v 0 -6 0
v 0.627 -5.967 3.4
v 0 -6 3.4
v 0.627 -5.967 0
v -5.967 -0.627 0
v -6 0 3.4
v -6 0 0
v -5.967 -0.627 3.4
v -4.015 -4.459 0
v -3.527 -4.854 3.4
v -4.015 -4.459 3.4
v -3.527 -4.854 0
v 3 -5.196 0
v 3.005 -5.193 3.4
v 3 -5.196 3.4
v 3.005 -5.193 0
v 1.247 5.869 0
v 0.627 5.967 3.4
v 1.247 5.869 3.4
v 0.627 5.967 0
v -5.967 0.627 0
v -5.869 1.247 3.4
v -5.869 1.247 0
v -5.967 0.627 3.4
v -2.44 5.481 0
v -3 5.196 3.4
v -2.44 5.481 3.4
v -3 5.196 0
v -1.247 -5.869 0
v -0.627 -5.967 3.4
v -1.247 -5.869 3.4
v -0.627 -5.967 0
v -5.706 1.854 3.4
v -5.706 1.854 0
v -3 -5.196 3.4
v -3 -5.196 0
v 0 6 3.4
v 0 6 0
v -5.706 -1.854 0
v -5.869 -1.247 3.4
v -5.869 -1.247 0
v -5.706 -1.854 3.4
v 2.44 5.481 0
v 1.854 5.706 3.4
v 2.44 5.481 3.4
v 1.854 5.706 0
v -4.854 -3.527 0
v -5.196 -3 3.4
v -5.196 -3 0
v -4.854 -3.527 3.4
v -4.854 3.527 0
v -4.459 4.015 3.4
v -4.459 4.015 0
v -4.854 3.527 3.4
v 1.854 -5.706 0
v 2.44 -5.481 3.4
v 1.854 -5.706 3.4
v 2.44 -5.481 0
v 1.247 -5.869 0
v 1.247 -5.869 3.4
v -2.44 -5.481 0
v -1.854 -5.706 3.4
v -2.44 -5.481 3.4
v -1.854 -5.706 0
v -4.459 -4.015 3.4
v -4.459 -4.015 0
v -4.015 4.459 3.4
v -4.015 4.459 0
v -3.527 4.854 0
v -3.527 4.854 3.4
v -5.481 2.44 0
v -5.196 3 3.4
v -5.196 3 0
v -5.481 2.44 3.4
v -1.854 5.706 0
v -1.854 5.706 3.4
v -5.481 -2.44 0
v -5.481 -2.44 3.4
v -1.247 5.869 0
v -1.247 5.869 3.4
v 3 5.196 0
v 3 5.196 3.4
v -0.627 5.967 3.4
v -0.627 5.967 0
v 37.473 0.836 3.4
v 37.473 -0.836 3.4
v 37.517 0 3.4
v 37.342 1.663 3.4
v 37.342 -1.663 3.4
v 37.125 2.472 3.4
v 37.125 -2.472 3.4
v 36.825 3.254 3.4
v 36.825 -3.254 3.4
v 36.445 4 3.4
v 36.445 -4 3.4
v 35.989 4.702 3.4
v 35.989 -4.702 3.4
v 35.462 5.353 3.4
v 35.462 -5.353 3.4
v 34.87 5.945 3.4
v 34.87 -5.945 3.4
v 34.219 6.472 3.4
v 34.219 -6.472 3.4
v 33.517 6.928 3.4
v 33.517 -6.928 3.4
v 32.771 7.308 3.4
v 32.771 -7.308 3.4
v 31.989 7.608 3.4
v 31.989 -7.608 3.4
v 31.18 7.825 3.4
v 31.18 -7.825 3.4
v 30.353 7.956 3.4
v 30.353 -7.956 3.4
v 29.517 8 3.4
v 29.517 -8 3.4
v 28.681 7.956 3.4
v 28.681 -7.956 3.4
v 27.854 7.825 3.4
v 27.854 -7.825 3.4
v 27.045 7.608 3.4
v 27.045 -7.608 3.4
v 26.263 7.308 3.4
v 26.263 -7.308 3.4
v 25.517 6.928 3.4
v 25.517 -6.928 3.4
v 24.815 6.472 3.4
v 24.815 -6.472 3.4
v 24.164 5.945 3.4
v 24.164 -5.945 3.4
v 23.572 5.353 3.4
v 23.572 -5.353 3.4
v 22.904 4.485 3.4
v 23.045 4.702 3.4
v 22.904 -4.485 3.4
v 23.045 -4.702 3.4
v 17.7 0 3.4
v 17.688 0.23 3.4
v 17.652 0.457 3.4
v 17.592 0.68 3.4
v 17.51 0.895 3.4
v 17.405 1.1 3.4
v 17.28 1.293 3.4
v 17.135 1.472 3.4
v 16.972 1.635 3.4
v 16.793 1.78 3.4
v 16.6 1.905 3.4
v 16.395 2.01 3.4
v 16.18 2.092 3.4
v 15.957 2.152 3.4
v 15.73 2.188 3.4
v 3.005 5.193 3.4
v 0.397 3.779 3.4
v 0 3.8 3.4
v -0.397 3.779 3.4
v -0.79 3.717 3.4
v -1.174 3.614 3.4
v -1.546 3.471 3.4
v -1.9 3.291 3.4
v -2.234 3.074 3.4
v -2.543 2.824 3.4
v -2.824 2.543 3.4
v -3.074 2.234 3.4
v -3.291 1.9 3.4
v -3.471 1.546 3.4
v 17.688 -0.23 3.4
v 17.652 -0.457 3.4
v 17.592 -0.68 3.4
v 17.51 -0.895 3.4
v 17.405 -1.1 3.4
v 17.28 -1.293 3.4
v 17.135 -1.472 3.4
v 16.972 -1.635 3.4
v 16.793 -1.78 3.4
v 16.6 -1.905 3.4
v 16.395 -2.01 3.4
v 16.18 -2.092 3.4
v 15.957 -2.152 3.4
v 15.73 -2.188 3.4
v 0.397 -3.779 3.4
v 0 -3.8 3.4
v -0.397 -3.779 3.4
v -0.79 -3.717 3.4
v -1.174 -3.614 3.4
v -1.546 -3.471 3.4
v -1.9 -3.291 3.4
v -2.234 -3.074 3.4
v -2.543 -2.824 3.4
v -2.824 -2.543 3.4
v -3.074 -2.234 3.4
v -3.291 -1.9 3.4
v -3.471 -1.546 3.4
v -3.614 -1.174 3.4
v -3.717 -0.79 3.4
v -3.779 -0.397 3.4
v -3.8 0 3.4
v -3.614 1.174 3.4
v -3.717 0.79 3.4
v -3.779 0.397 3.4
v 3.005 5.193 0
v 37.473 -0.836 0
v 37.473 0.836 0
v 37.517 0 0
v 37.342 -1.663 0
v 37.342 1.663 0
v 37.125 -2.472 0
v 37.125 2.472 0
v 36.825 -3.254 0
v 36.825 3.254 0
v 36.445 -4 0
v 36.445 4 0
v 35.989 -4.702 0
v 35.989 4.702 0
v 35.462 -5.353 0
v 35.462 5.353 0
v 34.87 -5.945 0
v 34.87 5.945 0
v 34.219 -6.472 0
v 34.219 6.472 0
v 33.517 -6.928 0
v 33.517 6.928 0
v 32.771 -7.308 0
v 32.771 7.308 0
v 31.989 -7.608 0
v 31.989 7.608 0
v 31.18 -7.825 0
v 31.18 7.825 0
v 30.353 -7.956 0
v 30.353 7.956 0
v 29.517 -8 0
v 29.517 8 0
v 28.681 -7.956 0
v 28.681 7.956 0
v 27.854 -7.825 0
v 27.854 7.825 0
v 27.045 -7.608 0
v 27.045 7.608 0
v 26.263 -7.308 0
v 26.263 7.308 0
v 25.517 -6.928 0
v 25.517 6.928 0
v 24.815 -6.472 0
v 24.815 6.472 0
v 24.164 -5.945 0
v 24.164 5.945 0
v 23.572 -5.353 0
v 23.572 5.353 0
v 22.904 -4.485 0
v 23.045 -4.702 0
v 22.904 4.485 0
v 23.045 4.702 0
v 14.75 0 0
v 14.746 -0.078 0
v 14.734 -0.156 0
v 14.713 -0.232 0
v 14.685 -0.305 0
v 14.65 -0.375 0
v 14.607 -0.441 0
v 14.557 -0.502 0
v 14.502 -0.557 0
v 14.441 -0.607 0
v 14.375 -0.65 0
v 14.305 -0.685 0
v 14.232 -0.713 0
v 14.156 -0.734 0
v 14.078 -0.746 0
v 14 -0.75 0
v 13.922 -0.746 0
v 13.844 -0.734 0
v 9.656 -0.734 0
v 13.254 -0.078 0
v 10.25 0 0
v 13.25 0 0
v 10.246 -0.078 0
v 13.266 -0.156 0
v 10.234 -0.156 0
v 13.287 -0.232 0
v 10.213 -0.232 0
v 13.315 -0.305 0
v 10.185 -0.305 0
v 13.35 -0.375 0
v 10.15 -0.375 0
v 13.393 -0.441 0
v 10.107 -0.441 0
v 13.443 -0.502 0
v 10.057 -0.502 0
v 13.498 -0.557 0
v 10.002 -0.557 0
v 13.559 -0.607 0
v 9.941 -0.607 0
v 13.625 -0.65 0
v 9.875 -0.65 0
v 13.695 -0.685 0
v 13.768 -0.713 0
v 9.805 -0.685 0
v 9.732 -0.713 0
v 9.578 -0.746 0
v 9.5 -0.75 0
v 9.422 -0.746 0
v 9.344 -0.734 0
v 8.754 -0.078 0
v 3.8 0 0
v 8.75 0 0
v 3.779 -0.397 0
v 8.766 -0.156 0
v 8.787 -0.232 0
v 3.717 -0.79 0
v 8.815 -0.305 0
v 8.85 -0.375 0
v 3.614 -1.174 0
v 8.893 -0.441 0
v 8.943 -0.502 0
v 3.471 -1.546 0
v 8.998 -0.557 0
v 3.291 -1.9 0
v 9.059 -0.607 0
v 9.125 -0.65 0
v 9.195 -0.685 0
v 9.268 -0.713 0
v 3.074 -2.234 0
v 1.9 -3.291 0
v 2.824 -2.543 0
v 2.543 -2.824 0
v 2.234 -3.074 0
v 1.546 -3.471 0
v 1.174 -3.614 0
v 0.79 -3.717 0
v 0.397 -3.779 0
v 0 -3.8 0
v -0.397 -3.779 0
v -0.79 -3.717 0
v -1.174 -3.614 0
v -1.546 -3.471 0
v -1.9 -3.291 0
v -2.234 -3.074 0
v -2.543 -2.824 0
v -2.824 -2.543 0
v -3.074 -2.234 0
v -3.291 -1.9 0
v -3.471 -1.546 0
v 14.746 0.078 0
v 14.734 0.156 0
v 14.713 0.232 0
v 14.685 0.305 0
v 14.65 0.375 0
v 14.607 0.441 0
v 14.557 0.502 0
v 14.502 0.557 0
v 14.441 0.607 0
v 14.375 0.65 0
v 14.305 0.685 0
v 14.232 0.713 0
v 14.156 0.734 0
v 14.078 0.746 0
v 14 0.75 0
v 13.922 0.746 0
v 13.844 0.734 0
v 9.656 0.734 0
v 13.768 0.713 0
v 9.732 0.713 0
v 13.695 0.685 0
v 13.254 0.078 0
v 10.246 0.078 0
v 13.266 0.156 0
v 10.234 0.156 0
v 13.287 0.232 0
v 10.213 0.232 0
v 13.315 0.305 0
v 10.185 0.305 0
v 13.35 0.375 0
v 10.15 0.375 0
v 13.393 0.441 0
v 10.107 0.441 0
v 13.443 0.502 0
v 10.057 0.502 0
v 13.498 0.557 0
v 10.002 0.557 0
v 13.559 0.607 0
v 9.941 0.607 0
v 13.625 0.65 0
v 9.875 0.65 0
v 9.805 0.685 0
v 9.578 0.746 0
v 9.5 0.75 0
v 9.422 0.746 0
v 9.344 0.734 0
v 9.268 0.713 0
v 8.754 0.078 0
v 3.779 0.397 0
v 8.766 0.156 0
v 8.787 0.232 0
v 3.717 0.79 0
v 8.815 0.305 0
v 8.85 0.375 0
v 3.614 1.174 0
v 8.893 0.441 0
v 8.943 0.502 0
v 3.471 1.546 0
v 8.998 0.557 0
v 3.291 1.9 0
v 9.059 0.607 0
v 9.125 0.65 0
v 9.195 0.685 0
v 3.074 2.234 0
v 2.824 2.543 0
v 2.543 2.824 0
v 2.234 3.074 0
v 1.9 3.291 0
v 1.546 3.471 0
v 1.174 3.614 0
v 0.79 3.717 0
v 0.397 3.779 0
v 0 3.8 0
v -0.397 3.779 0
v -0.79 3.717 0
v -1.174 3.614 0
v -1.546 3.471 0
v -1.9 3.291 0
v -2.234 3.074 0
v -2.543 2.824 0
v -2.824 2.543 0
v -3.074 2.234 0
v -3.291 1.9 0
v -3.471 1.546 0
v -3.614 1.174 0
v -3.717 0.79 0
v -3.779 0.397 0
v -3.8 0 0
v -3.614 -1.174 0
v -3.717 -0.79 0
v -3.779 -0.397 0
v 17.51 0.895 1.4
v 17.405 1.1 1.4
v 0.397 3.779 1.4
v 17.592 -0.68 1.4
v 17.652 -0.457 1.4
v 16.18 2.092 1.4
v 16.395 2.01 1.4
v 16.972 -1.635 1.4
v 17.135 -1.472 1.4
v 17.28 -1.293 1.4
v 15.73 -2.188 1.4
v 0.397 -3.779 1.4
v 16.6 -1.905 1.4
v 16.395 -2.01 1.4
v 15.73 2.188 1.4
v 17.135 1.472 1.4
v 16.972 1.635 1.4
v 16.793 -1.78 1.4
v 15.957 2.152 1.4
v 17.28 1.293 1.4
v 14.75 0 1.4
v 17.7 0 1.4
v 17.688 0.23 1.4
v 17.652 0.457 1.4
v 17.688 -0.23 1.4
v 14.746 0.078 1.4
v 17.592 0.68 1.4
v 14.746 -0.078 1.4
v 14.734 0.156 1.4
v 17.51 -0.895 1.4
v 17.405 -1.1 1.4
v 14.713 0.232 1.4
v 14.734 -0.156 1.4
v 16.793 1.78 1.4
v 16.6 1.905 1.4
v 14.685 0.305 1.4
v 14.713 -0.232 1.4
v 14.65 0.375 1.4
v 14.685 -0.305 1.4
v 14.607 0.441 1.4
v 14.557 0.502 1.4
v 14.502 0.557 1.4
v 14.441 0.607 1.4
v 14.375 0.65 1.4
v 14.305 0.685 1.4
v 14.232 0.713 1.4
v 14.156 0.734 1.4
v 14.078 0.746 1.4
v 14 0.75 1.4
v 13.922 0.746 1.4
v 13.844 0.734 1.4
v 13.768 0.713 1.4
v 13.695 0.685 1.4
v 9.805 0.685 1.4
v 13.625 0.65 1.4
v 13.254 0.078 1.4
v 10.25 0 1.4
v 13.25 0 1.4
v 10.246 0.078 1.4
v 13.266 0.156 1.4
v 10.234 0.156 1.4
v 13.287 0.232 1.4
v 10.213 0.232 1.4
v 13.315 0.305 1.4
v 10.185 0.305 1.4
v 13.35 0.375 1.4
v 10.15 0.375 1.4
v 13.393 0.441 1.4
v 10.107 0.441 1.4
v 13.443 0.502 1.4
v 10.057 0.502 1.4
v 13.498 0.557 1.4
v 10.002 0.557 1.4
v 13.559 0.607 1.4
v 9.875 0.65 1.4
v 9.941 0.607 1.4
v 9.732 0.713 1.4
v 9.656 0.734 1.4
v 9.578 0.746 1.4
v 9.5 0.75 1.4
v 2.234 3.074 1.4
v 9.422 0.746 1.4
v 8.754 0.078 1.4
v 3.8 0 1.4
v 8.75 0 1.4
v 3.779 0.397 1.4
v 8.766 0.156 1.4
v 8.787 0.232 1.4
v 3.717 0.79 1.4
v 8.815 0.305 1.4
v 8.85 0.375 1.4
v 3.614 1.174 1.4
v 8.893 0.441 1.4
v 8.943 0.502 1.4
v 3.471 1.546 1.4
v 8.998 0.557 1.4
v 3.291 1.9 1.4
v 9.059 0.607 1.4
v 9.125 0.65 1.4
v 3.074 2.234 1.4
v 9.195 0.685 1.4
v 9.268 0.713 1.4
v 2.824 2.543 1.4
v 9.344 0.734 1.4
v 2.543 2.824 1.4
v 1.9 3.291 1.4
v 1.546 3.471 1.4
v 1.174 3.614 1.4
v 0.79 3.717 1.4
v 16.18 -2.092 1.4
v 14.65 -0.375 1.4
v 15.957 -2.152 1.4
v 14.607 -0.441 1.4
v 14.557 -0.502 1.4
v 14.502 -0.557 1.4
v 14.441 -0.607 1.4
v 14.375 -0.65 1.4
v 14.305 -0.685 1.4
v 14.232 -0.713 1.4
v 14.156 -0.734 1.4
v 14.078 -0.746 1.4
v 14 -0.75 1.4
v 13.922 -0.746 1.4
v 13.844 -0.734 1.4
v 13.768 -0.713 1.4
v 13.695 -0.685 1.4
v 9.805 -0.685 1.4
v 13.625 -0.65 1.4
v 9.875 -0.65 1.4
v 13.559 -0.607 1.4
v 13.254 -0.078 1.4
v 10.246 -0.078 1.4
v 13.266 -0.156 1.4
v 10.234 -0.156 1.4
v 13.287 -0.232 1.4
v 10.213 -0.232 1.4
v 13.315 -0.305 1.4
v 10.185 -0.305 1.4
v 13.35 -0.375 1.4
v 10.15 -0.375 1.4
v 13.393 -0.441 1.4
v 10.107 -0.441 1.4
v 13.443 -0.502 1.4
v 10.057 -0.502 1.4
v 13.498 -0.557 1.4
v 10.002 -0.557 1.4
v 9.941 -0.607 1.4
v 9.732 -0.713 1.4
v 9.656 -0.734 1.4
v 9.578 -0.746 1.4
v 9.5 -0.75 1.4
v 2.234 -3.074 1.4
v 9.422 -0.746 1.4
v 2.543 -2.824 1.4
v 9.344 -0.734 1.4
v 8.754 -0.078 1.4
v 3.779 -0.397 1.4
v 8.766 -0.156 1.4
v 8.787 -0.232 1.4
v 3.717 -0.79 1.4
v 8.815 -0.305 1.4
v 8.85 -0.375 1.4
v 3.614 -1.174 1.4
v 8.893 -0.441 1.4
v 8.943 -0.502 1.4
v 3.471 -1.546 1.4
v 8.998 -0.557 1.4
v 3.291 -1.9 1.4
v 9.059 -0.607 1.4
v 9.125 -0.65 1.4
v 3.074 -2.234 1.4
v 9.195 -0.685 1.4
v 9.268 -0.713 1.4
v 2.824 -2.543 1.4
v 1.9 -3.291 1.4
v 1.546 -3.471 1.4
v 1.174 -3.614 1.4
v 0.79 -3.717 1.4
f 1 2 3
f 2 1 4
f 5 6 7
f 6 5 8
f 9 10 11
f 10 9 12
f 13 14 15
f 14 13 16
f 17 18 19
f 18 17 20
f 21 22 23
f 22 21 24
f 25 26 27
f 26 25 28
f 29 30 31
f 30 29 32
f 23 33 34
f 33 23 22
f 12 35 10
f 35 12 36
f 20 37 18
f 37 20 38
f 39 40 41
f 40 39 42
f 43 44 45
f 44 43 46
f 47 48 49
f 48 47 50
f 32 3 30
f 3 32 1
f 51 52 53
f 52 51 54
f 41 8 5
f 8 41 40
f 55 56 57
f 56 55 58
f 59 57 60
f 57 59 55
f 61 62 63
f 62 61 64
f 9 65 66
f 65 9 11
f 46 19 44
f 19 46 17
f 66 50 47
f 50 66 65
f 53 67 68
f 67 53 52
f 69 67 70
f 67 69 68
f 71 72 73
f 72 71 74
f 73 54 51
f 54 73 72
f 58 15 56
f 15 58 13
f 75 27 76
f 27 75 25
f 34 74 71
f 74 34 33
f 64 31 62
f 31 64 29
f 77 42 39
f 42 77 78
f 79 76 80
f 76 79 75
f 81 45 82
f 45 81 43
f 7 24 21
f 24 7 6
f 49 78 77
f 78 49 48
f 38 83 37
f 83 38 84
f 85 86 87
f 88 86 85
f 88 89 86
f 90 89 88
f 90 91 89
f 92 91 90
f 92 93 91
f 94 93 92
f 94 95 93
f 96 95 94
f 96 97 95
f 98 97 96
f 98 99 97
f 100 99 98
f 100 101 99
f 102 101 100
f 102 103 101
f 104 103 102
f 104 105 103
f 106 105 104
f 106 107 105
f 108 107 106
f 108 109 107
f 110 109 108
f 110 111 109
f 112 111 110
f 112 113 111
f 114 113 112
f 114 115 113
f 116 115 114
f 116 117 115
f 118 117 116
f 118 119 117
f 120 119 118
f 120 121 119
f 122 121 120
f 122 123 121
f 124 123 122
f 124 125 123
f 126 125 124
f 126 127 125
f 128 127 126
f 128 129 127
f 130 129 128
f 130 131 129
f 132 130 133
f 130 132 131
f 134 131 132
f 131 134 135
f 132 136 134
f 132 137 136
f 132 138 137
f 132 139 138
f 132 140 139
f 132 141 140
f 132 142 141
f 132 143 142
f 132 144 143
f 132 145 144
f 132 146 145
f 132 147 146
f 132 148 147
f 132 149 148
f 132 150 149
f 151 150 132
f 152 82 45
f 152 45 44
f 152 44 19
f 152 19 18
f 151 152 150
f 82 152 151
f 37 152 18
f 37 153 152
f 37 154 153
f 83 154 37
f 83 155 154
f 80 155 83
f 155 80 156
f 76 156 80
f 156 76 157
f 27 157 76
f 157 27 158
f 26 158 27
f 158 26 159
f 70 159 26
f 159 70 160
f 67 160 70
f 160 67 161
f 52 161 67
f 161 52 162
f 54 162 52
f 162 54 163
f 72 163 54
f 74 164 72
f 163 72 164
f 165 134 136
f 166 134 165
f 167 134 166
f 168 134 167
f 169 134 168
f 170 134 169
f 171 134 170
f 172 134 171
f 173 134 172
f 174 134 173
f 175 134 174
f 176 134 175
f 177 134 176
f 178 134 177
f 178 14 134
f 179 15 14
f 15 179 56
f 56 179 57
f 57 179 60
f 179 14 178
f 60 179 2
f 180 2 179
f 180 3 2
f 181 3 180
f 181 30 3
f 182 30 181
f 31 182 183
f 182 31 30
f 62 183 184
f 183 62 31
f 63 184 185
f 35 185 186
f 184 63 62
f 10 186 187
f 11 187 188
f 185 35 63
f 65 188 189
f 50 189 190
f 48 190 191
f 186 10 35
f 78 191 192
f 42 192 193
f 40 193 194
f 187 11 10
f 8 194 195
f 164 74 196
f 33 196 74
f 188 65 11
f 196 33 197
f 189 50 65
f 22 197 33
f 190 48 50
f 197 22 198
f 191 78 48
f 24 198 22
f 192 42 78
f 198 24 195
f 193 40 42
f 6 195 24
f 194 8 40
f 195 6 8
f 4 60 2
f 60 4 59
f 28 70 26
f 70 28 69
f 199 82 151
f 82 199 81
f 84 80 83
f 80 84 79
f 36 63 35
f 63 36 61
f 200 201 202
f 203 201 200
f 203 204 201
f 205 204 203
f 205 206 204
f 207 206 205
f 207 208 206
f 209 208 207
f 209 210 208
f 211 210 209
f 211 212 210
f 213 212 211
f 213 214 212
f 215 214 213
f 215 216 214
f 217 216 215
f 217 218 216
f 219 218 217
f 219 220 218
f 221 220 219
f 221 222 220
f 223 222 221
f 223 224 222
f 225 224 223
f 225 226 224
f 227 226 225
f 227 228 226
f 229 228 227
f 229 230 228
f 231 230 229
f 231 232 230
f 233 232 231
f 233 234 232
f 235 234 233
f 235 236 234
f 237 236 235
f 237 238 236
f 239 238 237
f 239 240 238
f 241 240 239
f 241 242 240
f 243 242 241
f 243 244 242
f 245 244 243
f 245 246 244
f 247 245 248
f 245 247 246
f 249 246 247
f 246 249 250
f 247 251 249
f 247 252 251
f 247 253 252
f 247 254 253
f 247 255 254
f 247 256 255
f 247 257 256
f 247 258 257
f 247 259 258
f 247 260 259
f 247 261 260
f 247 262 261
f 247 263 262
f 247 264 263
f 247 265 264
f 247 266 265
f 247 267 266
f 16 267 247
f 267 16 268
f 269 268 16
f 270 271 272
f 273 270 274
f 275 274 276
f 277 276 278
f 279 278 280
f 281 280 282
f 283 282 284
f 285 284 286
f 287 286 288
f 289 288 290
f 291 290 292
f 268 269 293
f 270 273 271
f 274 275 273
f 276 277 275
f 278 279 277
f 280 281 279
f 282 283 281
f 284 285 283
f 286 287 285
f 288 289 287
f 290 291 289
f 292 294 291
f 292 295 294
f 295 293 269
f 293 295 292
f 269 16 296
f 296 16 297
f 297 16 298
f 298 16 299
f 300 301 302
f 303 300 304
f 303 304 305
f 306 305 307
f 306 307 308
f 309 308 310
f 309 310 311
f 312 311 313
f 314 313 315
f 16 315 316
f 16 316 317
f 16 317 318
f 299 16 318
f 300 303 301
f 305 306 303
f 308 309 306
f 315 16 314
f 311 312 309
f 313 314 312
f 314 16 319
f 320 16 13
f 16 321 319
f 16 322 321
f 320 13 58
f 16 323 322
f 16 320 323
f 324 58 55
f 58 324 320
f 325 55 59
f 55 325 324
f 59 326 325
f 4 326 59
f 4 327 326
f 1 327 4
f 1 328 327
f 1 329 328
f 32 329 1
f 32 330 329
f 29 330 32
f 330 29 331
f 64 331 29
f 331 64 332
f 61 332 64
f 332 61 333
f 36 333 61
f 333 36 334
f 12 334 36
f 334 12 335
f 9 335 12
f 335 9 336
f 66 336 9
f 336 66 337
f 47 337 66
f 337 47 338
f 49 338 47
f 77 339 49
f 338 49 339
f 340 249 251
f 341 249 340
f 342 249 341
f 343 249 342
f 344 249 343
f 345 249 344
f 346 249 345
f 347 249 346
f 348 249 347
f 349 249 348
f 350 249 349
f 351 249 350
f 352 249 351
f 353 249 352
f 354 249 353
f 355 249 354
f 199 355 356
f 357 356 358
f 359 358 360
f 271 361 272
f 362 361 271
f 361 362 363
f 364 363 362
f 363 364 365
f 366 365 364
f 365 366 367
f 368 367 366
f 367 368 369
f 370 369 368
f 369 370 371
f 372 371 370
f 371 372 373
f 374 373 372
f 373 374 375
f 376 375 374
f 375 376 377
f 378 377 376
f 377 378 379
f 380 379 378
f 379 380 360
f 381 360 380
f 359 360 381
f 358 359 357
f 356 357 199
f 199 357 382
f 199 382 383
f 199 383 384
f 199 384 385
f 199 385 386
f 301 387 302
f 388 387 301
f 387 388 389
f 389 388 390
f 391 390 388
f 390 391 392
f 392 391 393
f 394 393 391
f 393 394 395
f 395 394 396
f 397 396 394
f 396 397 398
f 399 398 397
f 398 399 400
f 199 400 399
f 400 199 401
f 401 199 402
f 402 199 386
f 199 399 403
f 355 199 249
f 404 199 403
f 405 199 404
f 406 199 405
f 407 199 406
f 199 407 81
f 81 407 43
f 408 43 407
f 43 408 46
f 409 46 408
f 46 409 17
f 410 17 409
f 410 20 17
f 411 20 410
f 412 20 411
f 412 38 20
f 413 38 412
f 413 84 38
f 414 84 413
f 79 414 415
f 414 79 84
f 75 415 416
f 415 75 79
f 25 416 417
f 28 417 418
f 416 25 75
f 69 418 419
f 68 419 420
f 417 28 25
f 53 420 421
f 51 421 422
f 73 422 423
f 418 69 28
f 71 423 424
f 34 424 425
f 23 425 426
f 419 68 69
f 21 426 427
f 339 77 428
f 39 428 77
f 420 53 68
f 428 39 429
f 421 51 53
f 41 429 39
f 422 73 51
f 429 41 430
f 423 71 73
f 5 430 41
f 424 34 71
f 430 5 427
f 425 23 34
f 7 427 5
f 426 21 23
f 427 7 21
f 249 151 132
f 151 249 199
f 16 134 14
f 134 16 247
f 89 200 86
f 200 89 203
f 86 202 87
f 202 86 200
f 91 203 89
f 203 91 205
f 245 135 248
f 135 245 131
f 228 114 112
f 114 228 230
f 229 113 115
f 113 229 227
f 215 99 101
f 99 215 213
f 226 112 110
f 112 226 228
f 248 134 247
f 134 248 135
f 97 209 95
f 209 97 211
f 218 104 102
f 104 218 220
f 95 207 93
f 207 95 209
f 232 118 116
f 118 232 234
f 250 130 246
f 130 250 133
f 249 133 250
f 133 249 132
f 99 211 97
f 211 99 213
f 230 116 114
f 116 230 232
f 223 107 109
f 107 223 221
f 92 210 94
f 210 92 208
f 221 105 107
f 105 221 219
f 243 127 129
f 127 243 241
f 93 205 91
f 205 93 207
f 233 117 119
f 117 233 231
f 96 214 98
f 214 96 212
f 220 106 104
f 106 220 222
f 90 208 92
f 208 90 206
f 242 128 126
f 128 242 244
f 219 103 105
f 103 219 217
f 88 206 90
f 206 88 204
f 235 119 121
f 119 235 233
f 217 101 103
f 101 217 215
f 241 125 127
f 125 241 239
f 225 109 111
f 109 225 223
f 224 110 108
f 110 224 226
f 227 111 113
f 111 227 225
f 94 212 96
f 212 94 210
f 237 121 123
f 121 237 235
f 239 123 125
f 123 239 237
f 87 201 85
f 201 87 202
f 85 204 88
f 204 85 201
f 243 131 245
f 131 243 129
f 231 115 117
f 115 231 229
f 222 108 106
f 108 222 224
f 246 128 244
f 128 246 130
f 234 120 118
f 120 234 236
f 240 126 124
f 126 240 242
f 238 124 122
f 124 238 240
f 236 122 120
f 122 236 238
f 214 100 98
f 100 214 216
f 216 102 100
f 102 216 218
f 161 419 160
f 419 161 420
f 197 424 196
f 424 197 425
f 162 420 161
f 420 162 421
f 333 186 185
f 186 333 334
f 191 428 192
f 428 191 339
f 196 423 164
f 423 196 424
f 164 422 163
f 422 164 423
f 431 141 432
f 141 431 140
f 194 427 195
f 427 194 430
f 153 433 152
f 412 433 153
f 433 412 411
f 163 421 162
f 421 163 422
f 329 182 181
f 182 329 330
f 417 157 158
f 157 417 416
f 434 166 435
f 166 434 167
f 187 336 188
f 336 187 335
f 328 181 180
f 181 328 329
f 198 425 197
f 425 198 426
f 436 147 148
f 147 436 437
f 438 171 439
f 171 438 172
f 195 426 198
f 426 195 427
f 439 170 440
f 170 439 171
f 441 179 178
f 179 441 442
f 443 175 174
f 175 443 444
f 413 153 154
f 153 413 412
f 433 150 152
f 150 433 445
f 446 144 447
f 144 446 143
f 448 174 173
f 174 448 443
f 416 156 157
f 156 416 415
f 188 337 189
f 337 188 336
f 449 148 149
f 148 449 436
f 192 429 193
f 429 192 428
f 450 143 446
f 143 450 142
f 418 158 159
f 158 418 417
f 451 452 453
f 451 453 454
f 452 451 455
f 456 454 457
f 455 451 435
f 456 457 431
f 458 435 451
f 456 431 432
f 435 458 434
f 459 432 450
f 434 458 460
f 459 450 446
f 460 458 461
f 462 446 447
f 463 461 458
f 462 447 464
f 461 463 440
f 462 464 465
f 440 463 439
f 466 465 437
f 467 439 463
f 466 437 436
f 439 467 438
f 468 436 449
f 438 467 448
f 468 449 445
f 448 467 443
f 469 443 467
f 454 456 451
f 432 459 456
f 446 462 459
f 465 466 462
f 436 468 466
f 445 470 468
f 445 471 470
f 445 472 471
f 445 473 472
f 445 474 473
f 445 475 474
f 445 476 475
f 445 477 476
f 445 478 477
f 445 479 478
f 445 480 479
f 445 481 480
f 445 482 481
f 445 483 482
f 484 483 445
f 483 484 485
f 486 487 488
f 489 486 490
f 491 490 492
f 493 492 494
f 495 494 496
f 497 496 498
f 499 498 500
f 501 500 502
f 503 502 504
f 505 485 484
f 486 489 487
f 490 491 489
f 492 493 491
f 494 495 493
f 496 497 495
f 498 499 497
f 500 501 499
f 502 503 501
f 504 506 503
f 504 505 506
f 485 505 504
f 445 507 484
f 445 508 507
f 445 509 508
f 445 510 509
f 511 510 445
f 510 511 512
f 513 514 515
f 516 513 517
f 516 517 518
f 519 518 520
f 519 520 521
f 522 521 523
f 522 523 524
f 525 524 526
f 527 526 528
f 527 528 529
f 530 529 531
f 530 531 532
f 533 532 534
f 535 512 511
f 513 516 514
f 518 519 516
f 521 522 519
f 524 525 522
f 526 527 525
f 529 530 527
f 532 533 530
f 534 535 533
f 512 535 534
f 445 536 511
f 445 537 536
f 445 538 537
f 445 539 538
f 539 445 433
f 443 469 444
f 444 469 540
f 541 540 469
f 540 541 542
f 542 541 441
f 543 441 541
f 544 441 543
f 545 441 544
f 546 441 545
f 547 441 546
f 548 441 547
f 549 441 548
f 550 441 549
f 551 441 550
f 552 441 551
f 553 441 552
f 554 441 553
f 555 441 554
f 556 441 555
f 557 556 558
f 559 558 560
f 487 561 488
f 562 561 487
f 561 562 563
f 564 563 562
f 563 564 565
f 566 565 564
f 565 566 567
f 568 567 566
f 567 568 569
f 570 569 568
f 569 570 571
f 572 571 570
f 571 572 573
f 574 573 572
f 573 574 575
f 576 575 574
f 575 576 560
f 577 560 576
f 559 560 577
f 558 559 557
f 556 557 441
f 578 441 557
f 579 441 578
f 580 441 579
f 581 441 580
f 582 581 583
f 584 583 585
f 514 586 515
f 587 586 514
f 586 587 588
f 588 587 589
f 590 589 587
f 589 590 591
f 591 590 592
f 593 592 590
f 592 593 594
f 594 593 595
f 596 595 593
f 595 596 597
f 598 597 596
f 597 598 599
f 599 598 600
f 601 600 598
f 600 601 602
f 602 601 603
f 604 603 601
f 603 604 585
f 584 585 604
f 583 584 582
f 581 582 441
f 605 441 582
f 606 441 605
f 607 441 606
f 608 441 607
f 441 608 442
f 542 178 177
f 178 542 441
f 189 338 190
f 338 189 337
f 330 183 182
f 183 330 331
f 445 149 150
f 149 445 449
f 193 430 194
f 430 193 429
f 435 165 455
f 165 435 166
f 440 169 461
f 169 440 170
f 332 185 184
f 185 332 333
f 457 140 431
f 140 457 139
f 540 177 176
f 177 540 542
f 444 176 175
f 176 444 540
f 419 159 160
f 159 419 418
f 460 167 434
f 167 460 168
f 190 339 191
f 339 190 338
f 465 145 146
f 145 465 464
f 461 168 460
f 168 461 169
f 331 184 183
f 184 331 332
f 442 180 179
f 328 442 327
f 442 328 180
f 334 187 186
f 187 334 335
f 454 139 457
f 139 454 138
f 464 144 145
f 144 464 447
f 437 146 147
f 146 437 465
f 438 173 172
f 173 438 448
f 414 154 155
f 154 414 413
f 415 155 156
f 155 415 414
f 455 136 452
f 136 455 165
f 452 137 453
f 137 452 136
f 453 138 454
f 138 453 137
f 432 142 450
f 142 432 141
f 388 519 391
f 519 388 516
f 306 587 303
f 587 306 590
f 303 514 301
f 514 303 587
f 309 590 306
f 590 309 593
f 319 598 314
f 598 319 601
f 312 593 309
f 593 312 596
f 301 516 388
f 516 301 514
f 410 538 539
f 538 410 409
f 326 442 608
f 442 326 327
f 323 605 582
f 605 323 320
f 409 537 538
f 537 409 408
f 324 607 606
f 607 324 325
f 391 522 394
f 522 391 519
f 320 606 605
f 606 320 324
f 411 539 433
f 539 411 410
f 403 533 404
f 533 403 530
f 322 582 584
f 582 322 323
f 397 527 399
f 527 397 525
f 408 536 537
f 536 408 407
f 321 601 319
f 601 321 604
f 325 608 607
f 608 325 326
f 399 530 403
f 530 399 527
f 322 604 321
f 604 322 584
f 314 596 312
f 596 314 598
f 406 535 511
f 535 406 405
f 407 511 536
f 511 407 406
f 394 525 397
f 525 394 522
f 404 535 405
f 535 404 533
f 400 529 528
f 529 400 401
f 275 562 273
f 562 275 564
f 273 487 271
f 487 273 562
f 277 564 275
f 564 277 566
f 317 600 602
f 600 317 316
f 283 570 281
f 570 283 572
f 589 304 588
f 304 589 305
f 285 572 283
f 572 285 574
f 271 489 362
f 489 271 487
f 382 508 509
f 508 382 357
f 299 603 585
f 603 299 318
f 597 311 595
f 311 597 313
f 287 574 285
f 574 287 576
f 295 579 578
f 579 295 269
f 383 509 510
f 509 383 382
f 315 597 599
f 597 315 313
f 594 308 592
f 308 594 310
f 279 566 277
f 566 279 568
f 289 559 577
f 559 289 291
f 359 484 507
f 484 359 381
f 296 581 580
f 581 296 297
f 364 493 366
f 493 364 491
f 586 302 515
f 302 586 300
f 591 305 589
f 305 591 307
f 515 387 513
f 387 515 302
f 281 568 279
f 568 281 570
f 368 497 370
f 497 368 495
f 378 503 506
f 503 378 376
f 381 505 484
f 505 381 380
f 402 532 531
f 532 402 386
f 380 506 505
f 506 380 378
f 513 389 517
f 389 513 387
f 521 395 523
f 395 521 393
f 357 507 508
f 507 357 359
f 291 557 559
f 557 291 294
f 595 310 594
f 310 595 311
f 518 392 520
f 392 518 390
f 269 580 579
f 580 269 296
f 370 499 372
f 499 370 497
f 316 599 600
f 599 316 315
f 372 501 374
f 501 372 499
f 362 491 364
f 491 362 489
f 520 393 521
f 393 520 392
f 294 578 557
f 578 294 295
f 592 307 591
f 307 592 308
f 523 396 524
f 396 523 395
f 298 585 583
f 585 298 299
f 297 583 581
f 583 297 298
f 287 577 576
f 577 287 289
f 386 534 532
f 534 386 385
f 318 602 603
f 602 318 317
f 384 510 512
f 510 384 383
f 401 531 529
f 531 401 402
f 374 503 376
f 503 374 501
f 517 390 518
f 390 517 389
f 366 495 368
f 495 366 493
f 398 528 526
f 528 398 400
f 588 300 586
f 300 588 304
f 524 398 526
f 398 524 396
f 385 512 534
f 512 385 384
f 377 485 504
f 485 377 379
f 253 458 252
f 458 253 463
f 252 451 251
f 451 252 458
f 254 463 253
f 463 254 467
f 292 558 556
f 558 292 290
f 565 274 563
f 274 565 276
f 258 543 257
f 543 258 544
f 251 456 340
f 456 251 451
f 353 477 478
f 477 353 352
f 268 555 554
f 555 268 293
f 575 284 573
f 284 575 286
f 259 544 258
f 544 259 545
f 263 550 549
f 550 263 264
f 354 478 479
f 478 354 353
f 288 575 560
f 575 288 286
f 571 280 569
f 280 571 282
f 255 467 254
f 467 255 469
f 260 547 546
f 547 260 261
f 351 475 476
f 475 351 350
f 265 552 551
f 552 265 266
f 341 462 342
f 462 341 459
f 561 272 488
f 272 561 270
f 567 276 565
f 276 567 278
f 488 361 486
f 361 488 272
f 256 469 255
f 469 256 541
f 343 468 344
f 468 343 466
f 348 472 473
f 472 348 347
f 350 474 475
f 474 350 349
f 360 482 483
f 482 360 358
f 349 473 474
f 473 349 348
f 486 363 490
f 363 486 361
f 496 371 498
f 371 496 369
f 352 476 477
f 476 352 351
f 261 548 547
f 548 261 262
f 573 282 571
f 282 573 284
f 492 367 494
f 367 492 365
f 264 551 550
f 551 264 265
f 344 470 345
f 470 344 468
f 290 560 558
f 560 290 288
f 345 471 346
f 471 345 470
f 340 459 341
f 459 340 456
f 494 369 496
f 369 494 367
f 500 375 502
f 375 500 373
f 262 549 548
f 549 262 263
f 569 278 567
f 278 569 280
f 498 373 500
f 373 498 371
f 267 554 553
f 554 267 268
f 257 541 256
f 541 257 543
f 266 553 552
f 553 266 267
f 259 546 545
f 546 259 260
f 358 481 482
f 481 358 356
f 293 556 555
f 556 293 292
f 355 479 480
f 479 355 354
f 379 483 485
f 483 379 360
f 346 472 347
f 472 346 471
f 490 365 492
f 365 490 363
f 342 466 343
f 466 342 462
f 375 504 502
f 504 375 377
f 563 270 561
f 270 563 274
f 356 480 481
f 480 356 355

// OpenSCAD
$fn = 60;

posisi_poros_x = 9.5; posisi_poros_y = 12.0;
posisi_lubang_x = 39.0; posisi_lubang_y = 11.0;
jarak_poros_ke_lubang = sqrt(pow(posisi_lubang_x - posisi_poros_x, 2) + pow(posisi_lubang_y - posisi_poros_y, 2));
diameter_pelat_penutup = 16.0;

horn_tebal = 2.0; // 2.0 mm kedalaman ceruk horn bawaan MG90S
horn_panjang_lengan = 15.5;
horn_lebar_pangkal = 7.6;
horn_lebar_ujung = 4.4;
tebal_katup_total = horn_tebal + 1.4;

module bentuk_katup_dasar() {
    difference() {
        union() {
            cylinder(h = tebal_katup_total, d = 12.0);
            hull() {
                cylinder(h = tebal_katup_total, d = 10.6);
                translate([jarak_poros_ke_lubang, 0, 0]) cylinder(h = tebal_katup_total, d = 8.5);
            }
            translate([jarak_poros_ke_lubang, 0, 0]) cylinder(h = tebal_katup_total, d = diameter_pelat_penutup);
        }
        translate([0, 0, -0.1])
            hull() {
                cylinder(h = horn_tebal + 0.1, d = horn_lebar_pangkal);
                translate([horn_panjang_lengan, 0, 0]) cylinder(h = horn_tebal + 0.1, d = horn_lebar_ujung);
            }
        translate([0, 0, -1]) cylinder(h = tebal_katup_total + 2, d = 7.6);
        translate([9.5, 0, -1]) cylinder(h = tebal_katup_total + 2, d = 1.5);
        translate([14.0, 0, -1]) cylinder(h = tebal_katup_total + 2, d = 1.5);
    }
}

module katup_horn(siap_print = true) {
    if (siap_print) {
        // Dibalik agar ceruk horn menghadap ke atas saat dicetak tanpa support
        translate([0, 0, tebal_katup_total])
        rotate([180, 0, 0])
            bentuk_katup_dasar();
    } else {
        // Posisi normal tegak untuk dipasang ke poros servo
        bentuk_katup_dasar();
    }
}

katup_horn(siap_print = true);
